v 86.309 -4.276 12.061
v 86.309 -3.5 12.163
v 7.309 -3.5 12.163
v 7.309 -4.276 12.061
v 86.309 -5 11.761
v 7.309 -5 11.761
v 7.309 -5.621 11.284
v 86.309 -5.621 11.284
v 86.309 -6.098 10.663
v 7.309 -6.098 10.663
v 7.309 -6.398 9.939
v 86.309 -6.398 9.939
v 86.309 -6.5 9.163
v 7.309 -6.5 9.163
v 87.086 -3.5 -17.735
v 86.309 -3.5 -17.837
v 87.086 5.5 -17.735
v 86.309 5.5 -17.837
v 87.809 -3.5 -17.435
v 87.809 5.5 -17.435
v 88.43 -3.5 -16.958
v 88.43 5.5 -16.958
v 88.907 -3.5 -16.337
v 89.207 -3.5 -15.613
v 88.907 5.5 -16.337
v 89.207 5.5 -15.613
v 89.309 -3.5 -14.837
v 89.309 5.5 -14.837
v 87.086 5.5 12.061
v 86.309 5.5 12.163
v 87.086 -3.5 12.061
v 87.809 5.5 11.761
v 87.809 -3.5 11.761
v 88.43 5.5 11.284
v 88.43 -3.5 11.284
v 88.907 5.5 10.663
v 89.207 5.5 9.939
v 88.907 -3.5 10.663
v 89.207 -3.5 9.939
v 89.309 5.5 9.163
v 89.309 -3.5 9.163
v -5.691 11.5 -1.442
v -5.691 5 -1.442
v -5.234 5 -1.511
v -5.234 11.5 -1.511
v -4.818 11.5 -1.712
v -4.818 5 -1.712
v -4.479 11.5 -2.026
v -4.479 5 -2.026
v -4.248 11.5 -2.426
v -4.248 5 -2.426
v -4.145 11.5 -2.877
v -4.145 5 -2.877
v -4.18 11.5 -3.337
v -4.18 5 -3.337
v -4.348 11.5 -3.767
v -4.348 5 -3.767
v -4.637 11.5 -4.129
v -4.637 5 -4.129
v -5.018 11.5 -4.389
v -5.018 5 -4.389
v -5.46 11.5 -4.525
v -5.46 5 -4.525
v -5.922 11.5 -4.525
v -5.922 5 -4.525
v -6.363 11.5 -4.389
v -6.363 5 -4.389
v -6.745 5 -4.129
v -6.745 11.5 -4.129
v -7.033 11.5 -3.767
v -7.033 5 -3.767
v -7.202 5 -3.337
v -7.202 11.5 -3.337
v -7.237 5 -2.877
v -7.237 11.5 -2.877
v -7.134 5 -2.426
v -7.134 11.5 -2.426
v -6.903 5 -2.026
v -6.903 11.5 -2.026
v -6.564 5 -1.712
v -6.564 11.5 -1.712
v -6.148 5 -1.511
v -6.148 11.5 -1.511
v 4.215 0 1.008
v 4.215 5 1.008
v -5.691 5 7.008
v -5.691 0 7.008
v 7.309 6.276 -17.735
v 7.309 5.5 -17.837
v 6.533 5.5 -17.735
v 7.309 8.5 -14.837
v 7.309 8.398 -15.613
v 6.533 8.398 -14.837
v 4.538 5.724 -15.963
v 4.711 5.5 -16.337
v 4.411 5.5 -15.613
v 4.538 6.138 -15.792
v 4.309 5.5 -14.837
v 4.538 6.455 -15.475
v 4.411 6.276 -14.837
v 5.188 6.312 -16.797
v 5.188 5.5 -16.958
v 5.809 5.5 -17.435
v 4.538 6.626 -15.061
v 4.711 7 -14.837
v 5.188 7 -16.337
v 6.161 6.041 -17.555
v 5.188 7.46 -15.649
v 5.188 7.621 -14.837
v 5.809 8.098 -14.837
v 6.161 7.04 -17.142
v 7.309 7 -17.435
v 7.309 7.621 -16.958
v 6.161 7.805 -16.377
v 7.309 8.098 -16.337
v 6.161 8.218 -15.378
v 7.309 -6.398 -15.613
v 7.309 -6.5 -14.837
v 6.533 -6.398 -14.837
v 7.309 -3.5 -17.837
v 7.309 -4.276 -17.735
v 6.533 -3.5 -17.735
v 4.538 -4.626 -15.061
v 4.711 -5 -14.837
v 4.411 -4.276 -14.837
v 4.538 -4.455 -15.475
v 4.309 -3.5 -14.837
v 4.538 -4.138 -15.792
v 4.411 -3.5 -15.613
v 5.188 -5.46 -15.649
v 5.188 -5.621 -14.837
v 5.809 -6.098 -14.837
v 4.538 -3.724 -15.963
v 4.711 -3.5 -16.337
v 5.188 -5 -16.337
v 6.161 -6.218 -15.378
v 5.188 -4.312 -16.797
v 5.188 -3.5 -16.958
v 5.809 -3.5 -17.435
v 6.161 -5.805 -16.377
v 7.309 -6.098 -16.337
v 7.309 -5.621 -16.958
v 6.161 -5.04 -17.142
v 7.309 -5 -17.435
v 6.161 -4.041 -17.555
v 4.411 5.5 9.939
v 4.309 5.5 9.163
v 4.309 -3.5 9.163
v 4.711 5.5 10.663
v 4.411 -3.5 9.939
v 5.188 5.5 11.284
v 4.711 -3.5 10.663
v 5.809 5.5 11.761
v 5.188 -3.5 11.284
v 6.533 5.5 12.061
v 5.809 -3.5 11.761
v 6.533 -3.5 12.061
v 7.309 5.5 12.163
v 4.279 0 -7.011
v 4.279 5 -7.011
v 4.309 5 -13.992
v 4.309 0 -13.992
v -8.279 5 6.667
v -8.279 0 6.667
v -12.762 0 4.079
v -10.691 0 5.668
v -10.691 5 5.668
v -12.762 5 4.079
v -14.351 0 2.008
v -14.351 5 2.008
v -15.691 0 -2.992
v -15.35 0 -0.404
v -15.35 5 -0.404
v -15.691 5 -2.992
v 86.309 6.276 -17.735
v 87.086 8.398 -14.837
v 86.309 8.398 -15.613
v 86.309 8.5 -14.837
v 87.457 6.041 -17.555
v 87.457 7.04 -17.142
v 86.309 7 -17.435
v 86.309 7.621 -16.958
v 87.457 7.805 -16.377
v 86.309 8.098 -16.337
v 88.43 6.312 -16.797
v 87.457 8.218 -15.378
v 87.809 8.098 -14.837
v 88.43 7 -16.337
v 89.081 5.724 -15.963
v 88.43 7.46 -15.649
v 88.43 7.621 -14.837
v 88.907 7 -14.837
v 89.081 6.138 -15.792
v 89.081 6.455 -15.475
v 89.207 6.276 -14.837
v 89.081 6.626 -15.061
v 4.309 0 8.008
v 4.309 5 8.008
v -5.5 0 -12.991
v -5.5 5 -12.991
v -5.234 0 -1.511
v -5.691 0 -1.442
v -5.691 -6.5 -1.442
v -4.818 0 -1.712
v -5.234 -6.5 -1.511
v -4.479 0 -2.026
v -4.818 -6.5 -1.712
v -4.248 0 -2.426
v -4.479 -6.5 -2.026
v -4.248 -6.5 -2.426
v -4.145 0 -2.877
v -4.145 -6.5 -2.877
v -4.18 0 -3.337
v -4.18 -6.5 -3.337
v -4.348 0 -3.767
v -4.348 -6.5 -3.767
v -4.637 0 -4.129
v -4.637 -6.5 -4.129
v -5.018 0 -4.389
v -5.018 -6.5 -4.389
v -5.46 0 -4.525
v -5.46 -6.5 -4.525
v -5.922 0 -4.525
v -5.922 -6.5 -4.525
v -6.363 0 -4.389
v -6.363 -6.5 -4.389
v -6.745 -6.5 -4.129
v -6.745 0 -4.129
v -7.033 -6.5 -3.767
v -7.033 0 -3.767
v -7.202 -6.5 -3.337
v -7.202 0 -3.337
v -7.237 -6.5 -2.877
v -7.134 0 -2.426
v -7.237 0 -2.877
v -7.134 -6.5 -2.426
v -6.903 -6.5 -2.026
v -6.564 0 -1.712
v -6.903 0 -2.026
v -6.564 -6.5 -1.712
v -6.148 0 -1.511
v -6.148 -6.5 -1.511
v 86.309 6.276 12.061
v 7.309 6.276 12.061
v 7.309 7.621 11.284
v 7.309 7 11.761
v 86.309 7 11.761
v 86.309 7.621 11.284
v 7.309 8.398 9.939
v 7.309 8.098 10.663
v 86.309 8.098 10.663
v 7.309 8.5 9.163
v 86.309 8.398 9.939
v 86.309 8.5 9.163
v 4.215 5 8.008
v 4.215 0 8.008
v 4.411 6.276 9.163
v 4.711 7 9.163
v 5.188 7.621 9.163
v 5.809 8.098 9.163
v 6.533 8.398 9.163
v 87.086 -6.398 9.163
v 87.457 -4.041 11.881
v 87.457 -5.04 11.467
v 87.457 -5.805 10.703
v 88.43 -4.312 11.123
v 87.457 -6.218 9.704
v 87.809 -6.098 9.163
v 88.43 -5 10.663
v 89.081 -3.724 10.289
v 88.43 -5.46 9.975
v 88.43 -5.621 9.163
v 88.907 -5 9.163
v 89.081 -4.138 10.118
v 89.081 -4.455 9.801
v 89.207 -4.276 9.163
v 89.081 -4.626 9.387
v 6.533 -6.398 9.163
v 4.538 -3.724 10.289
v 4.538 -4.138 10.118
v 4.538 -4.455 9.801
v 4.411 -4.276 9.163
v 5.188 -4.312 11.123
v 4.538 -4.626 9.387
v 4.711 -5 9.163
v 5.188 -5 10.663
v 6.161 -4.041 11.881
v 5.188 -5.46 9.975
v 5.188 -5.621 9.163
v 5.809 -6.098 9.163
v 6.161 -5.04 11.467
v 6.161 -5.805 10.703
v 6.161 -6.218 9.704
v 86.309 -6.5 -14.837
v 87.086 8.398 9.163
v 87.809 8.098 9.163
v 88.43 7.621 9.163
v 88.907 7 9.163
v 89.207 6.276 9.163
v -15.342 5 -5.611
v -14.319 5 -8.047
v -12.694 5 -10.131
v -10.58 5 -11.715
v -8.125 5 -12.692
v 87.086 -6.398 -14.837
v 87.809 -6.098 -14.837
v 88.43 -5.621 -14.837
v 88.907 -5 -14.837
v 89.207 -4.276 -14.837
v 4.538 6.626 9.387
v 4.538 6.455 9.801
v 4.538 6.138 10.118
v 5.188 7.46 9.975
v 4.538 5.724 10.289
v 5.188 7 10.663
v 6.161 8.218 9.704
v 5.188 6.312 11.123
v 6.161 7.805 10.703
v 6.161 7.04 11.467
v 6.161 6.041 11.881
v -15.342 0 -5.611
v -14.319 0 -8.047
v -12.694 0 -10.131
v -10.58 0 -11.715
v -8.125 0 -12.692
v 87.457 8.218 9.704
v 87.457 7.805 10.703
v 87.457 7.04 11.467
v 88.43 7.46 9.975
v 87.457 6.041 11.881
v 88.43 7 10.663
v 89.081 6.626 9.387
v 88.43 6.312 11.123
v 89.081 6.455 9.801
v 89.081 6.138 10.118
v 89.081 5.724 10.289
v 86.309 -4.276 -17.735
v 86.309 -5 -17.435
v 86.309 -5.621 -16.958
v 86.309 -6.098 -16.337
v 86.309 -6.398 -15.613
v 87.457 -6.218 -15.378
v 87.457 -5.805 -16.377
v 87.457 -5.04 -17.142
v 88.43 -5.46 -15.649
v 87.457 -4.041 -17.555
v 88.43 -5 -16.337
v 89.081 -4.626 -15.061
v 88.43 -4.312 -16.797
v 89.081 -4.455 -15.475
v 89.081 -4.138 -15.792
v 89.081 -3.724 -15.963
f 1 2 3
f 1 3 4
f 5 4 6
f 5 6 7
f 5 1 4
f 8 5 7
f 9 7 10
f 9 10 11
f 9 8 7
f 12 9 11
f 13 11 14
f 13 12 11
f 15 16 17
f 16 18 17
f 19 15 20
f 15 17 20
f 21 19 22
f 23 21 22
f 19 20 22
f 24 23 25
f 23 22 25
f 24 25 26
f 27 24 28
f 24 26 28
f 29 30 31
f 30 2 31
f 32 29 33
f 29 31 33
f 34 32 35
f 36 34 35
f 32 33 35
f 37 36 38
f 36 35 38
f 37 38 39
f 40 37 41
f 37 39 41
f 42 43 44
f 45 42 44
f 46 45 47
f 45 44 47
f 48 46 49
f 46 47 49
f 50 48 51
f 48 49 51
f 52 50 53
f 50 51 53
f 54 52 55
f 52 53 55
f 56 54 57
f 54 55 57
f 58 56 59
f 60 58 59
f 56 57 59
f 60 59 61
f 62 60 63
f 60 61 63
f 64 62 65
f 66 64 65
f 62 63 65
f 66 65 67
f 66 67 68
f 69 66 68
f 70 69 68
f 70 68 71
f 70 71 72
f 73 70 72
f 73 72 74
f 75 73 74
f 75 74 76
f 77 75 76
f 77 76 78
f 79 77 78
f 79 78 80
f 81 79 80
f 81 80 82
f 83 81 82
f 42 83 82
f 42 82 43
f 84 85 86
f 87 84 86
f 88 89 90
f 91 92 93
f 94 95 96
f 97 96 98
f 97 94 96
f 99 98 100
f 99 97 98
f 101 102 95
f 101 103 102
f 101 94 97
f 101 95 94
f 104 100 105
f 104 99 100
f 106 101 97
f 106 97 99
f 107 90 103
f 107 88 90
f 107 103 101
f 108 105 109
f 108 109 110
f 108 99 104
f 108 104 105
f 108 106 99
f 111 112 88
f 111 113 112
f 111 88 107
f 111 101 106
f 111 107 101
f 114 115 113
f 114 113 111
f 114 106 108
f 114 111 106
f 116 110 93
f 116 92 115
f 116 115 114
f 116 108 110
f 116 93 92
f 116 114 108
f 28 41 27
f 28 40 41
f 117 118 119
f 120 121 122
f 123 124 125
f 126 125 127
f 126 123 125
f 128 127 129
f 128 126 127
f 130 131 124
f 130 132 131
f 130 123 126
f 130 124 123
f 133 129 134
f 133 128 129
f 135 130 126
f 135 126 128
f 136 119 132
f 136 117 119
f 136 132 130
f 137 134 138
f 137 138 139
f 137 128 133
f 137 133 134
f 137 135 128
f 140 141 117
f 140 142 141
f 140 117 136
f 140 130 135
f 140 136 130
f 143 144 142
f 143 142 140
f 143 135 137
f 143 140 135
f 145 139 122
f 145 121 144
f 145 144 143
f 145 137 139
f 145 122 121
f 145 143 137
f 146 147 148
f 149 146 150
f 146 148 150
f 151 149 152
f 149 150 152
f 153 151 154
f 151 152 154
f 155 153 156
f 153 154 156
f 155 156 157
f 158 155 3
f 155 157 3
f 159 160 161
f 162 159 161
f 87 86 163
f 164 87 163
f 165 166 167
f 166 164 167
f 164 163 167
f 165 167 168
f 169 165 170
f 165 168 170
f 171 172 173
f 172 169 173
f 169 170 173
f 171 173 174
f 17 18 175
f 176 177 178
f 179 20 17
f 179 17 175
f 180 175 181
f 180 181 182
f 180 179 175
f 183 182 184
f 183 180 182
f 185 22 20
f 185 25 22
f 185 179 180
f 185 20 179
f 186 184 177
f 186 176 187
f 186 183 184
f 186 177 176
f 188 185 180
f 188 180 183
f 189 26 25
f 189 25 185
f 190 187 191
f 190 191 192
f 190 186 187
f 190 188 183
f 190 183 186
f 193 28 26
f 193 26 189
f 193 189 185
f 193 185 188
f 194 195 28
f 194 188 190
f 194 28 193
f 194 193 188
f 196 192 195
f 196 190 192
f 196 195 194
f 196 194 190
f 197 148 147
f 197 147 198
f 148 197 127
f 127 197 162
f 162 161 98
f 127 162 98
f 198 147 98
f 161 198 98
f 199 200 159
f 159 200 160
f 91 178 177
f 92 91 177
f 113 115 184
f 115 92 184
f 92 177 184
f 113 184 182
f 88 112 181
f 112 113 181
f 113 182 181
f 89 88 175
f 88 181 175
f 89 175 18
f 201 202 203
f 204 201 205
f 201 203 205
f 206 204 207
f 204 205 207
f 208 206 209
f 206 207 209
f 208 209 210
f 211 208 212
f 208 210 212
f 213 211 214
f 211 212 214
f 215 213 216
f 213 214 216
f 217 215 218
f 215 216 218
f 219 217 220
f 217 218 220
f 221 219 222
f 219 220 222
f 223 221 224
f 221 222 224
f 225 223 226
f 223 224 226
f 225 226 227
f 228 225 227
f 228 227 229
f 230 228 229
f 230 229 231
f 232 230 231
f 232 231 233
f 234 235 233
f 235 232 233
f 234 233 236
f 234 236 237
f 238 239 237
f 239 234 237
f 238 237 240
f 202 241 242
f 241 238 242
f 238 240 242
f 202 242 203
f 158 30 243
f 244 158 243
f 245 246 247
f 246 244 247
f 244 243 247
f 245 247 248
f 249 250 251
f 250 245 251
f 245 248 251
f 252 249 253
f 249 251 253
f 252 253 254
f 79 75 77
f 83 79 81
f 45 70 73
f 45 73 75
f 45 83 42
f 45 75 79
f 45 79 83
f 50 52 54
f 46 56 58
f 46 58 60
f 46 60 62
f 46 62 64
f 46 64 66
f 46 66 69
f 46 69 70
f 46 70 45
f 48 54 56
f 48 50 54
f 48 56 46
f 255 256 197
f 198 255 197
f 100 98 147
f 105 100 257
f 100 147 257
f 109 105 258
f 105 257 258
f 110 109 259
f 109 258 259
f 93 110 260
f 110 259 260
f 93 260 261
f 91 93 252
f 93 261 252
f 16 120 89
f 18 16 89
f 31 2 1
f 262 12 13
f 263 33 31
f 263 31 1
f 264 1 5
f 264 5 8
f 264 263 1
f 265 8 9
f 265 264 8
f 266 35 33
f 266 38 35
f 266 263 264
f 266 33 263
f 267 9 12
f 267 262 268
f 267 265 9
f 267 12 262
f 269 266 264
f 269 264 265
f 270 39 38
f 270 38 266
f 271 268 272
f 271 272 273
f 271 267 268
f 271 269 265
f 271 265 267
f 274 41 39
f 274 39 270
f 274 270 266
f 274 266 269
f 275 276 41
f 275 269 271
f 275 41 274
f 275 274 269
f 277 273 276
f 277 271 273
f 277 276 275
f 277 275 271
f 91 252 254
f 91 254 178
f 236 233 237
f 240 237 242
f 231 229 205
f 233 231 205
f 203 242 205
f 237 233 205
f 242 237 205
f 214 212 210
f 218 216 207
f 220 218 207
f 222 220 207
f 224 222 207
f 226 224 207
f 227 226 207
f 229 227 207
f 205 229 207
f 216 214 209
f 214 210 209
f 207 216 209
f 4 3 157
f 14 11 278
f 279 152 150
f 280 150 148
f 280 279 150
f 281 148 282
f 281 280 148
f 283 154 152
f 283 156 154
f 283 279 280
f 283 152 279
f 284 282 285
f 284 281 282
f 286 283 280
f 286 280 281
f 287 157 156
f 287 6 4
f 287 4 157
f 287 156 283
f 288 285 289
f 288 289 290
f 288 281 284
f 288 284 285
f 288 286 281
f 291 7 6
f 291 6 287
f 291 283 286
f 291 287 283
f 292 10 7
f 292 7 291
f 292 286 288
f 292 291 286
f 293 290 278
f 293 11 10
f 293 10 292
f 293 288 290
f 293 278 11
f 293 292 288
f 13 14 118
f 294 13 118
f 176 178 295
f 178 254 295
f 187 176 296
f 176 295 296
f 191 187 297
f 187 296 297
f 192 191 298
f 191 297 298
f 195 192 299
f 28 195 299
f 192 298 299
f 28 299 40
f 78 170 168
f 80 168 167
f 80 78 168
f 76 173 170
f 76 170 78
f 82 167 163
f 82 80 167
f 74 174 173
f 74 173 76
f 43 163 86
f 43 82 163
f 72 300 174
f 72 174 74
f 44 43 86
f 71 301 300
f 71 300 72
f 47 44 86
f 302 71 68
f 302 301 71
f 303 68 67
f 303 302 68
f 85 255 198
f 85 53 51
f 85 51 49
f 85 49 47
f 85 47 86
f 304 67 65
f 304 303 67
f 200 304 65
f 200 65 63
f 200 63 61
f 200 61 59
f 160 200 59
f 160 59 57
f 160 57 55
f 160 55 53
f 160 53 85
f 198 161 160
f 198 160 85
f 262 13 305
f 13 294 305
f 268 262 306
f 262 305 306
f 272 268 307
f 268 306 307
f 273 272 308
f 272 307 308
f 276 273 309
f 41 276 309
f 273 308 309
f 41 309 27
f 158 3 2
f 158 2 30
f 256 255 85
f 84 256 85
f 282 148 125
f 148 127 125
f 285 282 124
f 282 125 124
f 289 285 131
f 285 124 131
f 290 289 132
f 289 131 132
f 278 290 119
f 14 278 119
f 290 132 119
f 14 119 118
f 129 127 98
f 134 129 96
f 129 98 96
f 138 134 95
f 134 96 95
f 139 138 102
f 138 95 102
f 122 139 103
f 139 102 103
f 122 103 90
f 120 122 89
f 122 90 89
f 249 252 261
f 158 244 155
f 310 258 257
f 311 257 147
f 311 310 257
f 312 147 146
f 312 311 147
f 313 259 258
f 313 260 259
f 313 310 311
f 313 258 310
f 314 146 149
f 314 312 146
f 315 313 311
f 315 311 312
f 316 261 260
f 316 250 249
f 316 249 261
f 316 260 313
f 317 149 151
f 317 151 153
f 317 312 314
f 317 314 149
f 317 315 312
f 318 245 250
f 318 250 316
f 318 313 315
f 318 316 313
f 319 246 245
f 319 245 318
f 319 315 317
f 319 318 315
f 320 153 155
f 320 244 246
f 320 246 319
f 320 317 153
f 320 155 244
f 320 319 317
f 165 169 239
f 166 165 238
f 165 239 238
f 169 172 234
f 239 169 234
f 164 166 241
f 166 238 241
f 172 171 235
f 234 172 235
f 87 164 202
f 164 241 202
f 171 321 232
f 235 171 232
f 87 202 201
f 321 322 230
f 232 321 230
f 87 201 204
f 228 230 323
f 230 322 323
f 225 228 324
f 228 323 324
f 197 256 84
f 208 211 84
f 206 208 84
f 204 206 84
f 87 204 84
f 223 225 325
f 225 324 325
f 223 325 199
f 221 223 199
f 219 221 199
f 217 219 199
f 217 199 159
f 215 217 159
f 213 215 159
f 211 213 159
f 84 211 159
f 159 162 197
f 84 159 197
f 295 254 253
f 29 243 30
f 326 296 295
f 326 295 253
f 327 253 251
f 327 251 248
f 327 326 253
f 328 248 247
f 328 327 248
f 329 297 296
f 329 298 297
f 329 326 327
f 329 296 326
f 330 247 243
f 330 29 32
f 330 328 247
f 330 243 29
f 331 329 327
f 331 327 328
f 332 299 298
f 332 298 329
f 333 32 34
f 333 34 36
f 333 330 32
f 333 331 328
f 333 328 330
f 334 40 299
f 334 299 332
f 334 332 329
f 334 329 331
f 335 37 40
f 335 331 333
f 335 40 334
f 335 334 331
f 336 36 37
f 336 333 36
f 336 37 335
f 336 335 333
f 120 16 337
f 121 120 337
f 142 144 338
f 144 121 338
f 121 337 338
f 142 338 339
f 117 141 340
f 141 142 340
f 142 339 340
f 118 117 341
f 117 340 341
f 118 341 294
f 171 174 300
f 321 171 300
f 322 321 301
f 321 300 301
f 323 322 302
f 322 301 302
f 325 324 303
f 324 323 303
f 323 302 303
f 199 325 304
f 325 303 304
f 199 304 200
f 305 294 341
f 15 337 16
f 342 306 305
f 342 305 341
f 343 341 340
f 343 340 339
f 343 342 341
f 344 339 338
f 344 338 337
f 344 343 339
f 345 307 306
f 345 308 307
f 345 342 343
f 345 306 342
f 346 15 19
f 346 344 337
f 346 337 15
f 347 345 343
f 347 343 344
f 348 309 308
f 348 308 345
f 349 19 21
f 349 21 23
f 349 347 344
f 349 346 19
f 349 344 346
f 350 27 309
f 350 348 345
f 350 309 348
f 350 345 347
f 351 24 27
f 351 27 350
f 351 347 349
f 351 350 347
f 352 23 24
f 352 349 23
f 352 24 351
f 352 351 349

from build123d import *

# Parameters (mm, degrees)
SKETCH1_W                = 20
SKETCH1_H                = 22
BOSS_EXTRUDE1_DEPTH      = 5
BOSS_EXTRUDE2_DEPTH      = 6.5
BOSS_EXTRUDE2_DEPTH_BACK = 11.5
SKETCH2_R                = 1.55
SKETCH8_W                = 30
SKETCH8_H                = 15
BOSS_EXTRUDE3_DEPTH      = 85
FILLET1_R                = 3
FILLET2_R                = 3
FILLET3_R                = 3
FILLET4_R                = 3
FILLET5_R                = 3
FILLET6_R                = 3
CUT_EXTRUDE1_DEPTH       = 20
CUT_EXTRUDE2_DEPTH       = 20


with BuildPart() as part:
    # Sketch1 → Boss-Extrude1 (new body)
    with BuildSketch(Plane(origin=(8.035400608, 0, 0), x_dir=(1, 0, 0), z_dir=(0, 1, 0))):
        with Locations((-13.726235741, 2.992395437)):
            Rectangle(SKETCH1_W, SKETCH1_H)
    extrude(amount=BOSS_EXTRUDE1_DEPTH)

    # Sketch2 → Boss-Extrude2 (add, two sides: drawn at the far end of the back side and taken through both)
    with BuildSketch(Plane(origin=(8.035400608, 5, 0), x_dir=(1, 0, 0), z_dir=(0, 1, 0)).offset(-BOSS_EXTRUDE2_DEPTH_BACK)):
        with Locations((-13.726235741, 2.992395437)):
            Circle(SKETCH2_R)
    extrude(amount=BOSS_EXTRUDE2_DEPTH + BOSS_EXTRUDE2_DEPTH_BACK)

    # Sketch8 → Boss-Extrude3 (add)
    with BuildSketch(Plane(origin=(4.309164866, 0, 0), x_dir=(0, 0, -1), z_dir=(1, 0, 0))):
        with Locations((2.837033874, 1)):
            Rectangle(SKETCH8_W, SKETCH8_H)
    extrude(amount=BOSS_EXTRUDE3_DEPTH)

    # Fillet1
    fillet1_edges = [part.edges().sort_by_distance(p)[0] for p in [
        (46.809164866, -6.5, 12.162966126),
    ]]
    fillet(fillet1_edges, radius=FILLET1_R)

    # Fillet2
    fillet2_edges = [part.edges().sort_by_distance(p)[0] for p in [
        (46.809164866, 8.5, 12.162966126),
    ]]
    fillet(fillet2_edges, radius=FILLET2_R)

    # Fillet3
    fillet3_edges = [part.edges().sort_by_distance(p)[0] for p in [
        (46.809164866, 8.5, -17.837033874),
    ]]
    fillet(fillet3_edges, radius=FILLET3_R)

    # Fillet4
    fillet4_edges = [part.edges().sort_by_distance(p)[0] for p in [
        (46.809164866, -6.5, -17.837033874),
    ]]
    fillet(fillet4_edges, radius=FILLET4_R)

    # Fillet5
    fillet5_edges = [part.edges().sort_by_distance(p)[0] for p in [
        (89.309164866, -6.5, -2.837033874),
    ]]
    fillet(fillet5_edges, radius=FILLET5_R)

    # Fillet6
    fillet6_edges = [part.edges().sort_by_distance(p)[0] for p in [
        (4.309164866, 1, 12.162966126),
    ]]
    fillet(fillet6_edges, radius=FILLET6_R)

    # Sketch7 → Cut-Extrude1 (cut)
    with BuildSketch(Plane(origin=(8.035400608, 11.5, 0), x_dir=(1, 0, 0), z_dir=(0, 1, 0))):
        with BuildLine():
            ThreePointArc((-13.726235741, -7.007604563), (-20.797303553, -4.078672375), (-23.726235741, 2.992395437))
            Line((-23.726235741, 2.992395437), (-23.726235741, -8.007604563))
            Line((-23.726235741, -8.007604563), (-3.820368823, -8.007604563))
            Line((-3.820368823, -8.007604563), (-3.820368823, -1.007604563))
            Line((-3.820368823, -1.007604563), (-13.726235741, -7.007604563))
        make_face()
    extrude(amount=-CUT_EXTRUDE1_DEPTH, mode=Mode.SUBTRACT)

    # Sketch7<4> → Cut-Extrude2 (cut)
    with BuildSketch(Plane(origin=(8.035400608, 11.5, 0), x_dir=(1, 0, 0), z_dir=(0, 1, 0))):
        with BuildLine():
            Line((-23.726235741, 13.992395437), (-23.726235741, 2.992395437))
            ThreePointArc((-23.726235741, 2.992395437), (-20.729612149, 10.130512759), (-13.535691963, 12.990579926))
            Line((-13.535691963, 12.990579926), (-3.756109018, 7.010662038))
            Line((-3.756109018, 7.010662038), (-3.726235741, 13.992395437))
            Line((-3.726235741, 13.992395437), (-23.726235741, 13.992395437))
        make_face()
    extrude(amount=-CUT_EXTRUDE2_DEPTH, mode=Mode.SUBTRACT)


solid = part.part
